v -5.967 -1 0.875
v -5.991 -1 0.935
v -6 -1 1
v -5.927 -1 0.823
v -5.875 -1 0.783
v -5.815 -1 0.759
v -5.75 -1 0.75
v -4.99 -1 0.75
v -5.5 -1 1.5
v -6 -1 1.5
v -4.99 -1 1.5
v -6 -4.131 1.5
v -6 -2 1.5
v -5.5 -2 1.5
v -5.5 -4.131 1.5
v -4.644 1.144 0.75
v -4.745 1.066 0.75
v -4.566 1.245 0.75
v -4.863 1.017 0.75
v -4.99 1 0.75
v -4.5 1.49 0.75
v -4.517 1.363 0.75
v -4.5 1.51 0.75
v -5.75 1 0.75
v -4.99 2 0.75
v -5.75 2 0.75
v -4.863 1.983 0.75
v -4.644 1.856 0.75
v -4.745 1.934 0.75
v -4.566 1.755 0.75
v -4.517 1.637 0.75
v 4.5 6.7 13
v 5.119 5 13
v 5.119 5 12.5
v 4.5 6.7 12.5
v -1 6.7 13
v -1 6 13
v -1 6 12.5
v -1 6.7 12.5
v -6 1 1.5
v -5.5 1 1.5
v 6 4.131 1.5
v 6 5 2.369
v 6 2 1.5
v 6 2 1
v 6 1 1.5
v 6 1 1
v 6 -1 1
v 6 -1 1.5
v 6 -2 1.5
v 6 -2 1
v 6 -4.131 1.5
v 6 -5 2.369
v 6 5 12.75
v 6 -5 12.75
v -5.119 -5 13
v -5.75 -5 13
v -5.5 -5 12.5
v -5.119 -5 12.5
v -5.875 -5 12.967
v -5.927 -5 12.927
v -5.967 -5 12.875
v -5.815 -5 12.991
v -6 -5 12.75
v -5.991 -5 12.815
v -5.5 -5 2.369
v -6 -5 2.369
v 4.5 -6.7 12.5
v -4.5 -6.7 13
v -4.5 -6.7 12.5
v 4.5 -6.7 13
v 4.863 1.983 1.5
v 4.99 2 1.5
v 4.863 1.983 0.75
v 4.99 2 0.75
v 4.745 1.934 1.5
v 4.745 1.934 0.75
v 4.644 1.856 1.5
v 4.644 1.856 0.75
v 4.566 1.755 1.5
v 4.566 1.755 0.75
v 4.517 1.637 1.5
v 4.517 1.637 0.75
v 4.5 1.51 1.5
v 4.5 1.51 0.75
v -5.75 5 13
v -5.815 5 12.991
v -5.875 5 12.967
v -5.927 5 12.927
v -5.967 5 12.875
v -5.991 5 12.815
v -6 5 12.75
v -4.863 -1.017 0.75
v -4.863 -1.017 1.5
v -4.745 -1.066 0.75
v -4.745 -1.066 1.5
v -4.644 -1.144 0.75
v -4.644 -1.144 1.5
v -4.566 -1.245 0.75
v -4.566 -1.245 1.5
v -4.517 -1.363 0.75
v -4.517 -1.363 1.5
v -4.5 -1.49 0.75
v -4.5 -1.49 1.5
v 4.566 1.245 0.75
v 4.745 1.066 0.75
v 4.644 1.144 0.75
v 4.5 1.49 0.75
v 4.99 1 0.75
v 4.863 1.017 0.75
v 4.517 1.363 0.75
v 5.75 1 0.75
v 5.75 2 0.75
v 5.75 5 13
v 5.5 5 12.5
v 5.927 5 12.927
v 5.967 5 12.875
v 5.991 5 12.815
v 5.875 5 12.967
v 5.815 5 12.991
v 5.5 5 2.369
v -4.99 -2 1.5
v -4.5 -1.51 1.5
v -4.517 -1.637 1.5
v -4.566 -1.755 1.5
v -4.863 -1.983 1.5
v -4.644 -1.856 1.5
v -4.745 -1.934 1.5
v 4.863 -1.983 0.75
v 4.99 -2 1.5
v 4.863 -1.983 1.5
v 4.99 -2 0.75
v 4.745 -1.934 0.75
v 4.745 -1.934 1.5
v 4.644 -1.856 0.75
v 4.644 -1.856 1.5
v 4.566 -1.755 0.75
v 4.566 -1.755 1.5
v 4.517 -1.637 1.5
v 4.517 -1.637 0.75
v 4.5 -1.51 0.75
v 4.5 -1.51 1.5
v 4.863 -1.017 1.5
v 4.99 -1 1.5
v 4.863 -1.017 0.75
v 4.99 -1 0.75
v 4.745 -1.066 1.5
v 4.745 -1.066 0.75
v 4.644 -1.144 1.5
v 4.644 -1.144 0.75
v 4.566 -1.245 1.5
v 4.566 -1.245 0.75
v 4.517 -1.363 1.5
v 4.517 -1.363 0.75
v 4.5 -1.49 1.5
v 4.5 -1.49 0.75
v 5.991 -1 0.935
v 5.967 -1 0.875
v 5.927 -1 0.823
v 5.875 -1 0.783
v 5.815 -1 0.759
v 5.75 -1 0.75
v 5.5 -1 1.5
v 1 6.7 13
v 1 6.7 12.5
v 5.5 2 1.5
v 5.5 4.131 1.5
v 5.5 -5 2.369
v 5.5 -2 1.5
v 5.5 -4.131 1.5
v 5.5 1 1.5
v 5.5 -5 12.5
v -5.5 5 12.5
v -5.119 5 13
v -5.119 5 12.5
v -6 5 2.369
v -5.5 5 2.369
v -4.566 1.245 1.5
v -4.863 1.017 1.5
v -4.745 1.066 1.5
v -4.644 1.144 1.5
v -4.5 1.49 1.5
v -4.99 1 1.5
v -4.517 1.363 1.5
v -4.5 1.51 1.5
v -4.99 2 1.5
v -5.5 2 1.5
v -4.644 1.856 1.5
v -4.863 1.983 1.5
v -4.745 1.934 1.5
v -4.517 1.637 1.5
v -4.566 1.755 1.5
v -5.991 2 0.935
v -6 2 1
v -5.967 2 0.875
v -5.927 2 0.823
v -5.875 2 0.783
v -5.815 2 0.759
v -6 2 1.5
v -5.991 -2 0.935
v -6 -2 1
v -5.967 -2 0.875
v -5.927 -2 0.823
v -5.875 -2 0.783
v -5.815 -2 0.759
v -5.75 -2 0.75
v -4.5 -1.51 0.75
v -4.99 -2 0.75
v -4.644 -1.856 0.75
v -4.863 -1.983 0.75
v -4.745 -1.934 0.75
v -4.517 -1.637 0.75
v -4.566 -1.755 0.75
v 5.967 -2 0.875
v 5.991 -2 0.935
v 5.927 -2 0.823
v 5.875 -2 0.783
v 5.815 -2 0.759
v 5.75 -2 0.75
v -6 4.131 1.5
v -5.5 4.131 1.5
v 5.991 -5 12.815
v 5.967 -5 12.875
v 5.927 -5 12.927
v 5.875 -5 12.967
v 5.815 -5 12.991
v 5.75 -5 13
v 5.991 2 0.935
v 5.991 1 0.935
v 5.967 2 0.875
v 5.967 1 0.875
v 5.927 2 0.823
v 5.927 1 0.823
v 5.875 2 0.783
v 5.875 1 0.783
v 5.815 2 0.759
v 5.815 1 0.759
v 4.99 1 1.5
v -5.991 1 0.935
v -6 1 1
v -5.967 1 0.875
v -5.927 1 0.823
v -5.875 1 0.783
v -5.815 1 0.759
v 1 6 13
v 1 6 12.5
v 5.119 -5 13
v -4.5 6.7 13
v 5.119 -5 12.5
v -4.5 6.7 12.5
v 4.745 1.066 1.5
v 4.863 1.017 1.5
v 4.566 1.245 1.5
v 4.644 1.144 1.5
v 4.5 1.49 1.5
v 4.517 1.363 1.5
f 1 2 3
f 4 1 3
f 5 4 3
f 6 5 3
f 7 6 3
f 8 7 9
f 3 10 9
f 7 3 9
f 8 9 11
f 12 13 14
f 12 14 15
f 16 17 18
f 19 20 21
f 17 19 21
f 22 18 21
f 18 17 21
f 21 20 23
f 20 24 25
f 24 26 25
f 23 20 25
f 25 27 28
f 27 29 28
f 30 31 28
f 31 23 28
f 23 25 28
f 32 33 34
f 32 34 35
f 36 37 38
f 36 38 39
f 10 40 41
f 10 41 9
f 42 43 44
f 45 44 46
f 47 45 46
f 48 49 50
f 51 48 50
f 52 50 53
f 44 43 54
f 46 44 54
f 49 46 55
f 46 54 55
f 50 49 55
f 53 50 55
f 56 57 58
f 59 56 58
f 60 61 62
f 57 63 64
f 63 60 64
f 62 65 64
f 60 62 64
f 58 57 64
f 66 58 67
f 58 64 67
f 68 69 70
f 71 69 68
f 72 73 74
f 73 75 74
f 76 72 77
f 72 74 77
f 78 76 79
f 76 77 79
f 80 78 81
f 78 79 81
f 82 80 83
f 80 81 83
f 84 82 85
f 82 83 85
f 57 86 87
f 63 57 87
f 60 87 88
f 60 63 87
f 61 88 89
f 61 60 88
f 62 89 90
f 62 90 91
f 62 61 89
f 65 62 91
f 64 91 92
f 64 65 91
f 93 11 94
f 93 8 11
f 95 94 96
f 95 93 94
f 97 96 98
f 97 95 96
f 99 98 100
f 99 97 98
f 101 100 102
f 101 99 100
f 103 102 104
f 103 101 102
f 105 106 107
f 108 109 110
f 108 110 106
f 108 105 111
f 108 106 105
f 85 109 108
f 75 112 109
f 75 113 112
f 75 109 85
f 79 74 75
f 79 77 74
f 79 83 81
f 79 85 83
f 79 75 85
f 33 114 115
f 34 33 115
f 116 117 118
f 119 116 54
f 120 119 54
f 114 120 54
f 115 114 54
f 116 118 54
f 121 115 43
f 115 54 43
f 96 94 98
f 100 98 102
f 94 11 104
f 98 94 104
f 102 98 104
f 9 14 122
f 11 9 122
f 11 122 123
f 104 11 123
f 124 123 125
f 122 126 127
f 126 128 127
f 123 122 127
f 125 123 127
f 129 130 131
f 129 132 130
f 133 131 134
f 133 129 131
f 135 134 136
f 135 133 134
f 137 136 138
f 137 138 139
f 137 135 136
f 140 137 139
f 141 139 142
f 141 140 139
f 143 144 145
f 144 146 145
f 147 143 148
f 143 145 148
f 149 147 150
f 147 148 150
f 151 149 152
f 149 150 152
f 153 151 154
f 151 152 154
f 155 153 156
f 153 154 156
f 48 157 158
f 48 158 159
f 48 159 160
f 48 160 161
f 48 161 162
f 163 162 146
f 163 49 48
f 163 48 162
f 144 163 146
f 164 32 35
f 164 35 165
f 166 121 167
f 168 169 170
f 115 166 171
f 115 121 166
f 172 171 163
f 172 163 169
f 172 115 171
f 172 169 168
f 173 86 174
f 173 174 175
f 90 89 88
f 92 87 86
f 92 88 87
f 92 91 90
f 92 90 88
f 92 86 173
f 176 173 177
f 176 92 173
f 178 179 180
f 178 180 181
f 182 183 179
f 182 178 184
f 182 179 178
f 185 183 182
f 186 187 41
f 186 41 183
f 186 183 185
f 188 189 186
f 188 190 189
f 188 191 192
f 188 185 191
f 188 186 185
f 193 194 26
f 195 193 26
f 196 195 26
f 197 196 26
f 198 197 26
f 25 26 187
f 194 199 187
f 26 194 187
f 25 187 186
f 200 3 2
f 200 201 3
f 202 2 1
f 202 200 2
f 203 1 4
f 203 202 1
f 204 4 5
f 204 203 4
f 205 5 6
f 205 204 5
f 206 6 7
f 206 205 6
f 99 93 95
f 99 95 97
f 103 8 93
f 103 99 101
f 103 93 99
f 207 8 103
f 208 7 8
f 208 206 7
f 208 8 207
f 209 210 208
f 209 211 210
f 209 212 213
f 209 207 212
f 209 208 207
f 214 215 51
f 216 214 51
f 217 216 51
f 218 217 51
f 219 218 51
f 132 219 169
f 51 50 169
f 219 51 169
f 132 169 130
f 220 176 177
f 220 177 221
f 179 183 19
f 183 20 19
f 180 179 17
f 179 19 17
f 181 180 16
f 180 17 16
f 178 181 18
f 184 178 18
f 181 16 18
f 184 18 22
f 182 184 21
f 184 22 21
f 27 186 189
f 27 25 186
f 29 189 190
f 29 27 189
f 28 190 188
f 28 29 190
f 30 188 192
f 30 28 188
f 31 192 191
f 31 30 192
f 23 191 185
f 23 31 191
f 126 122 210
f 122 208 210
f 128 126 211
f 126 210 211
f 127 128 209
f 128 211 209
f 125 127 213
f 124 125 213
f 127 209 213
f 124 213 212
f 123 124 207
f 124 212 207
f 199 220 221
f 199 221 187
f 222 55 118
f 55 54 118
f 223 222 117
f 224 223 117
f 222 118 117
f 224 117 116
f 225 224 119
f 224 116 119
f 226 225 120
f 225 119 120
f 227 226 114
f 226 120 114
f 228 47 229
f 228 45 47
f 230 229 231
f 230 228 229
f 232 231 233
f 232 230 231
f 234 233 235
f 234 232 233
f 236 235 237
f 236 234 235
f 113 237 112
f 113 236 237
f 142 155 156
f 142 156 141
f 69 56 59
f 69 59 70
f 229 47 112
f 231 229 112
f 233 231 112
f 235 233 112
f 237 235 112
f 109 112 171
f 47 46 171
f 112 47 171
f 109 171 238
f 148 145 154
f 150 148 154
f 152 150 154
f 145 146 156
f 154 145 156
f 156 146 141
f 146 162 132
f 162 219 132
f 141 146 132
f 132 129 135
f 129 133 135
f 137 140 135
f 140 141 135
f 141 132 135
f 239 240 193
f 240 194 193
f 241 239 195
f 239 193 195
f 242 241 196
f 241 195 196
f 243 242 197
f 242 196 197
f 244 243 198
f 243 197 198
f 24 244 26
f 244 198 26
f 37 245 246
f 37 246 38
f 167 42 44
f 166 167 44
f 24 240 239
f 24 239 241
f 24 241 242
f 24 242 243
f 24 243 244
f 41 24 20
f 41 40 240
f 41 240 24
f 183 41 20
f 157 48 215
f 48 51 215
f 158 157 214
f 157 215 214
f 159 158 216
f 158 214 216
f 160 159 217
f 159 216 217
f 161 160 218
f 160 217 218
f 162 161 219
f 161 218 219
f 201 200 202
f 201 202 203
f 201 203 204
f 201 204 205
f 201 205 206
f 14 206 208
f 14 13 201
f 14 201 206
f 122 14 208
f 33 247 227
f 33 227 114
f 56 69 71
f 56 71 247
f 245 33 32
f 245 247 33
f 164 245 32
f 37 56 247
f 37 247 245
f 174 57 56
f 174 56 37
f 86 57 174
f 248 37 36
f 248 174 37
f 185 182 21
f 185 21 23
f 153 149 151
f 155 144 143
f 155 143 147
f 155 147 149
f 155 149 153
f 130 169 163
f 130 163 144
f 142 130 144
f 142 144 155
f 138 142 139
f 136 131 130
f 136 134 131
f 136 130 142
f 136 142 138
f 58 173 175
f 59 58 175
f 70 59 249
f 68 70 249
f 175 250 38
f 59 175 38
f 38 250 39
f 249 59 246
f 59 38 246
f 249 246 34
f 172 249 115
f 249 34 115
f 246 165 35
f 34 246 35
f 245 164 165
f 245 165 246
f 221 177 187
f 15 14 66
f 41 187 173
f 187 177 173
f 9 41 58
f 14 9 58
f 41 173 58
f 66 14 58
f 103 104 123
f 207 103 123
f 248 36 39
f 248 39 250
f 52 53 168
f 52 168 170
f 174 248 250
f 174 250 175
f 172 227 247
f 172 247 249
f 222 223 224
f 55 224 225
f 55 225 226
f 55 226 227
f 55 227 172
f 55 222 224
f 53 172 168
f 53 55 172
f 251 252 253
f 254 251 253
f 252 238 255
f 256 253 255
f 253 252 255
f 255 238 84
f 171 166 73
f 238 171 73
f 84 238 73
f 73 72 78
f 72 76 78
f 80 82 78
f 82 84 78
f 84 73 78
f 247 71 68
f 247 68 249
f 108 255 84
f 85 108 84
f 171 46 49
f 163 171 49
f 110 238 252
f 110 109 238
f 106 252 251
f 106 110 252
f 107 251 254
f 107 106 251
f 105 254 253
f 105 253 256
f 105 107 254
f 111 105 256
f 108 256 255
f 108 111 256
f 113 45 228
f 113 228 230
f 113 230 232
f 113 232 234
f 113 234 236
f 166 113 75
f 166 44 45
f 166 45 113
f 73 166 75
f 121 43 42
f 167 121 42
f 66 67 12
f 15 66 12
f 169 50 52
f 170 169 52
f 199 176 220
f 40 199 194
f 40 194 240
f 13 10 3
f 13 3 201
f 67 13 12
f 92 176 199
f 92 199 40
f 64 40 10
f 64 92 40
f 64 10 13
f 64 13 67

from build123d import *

# Parameters (mm, degrees)
PAD008_DEPTH               = 0.5
PAD009_DEPTH               = 0.5
PAD009_MIRRORED004_2_DEPTH = 0.5
SKETCH021_W                = 1.5
SKETCH021_H                = 1
PAD010_DEPTH               = 0.75
SKETCH021_MIRRORED006_2_W  = 1.5
SKETCH021_MIRRORED006_2_H  = 1
PAD010_MIRRORED006_2_DEPTH = 0.75
FILLET_R                   = 0.25
FILLET001_R                = 0.25
FILLET003_R                = 0.49


with BuildPart() as part:
    # Sketch018 → Pad008 (new body)
    with BuildSketch(Plane.XY.offset(13)):
        Polygon((-1, 6), (-1, 6.7), (-4.5, 6.7), (-5.118749, 5), (-5.5, 5), (-5.5, -5), (-5.118749, -5), (-4.5, -6.7), (4.5, -6.7), (5.118749, -5), (5.5, -5), (5.5, 5), (5.118749, 5), (4.5, 6.7), (1, 6.7), (1, 6), align=None)
    extrude(amount=-PAD008_DEPTH)

    # Sketch020 → Pad009 (join)
    with BuildSketch(Plane.YZ.offset(6)):
        Polygon((-5, 13), (-5, 2.368609), (-4.131391, 1.5), (-1, 1.5), (0, 1.5), (0, 13), align=None)
    pad009 = extrude(amount=-PAD009_DEPTH)

    # Sketch020 Mirrored004 2 → Pad009 Mirrored004 2 (add)
    with BuildSketch(Plane.YZ.offset(-6)):
        Polygon((-5, 13), (-5, 2.368609), (-4.131391, 1.5), (-1, 1.5), (0, 1.5), (0, 13), align=None)
    pad009_mirrored004_2 = extrude(amount=PAD009_MIRRORED004_2_DEPTH)

    # Mirrored005: Pad009, Pad009 Mirrored004 2 across XZ
    add(pad009.mirror(Plane.XZ))
    add(pad009_mirrored004_2.mirror(Plane.XZ))

    # Sketch021 → Pad010 (join)
    with BuildSketch(Plane.XY.offset(1.5)):
        with Locations((-5.25, 1.5)):
            Rectangle(SKETCH021_W, SKETCH021_H)
    pad010 = extrude(amount=-PAD010_DEPTH)

    # Sketch021 Mirrored006 2 → Pad010 Mirrored006 2 (add)
    with BuildSketch(Plane(origin=(0, 0, 1.5), x_dir=(-1, 0, 0), z_dir=(0, 0, -1))):
        with Locations((-5.25, 1.5)):
            Rectangle(SKETCH021_MIRRORED006_2_W, SKETCH021_MIRRORED006_2_H)
    pad010_mirrored006_2 = extrude(amount=PAD010_MIRRORED006_2_DEPTH)

    # Mirrored007: Pad010, Pad010 Mirrored006 2 across XZ
    add(pad010.mirror(Plane.XZ))
    add(pad010_mirrored006_2.mirror(Plane.XZ))

    # Fillet
    fillet_edges = [part.edges().sort_by_distance(p)[0] for p in [
        (-6, -1.5, 0.75),
        (-6, 1.5, 0.75),
        (6, 1.5, 0.75),
        (6, -1.5, 0.75),
    ]]
    fillet(fillet_edges, radius=FILLET_R)

    # Fillet001
    fillet001_edges = [part.edges().sort_by_distance(p)[0] for p in [
        (6, 0, 13),
        (-6, 0, 13),
    ]]
    fillet(fillet001_edges, radius=FILLET001_R)

    # Fillet003
    fillet003_edges = [part.edges().sort_by_distance(p)[0] for p in [
        (4.5, 2, 1.125),
        (4.5, 1, 1.125),
        (4.5, -1, 1.125),
        (4.5, -2, 1.125),
        (-4.5, -2, 1.125),
        (-4.5, -1, 1.125),
        (-4.5, 1, 1.125),
        (-4.5, 2, 1.125),
    ]]
    fillet(fillet003_edges, radius=FILLET003_R)


solid = part.part
